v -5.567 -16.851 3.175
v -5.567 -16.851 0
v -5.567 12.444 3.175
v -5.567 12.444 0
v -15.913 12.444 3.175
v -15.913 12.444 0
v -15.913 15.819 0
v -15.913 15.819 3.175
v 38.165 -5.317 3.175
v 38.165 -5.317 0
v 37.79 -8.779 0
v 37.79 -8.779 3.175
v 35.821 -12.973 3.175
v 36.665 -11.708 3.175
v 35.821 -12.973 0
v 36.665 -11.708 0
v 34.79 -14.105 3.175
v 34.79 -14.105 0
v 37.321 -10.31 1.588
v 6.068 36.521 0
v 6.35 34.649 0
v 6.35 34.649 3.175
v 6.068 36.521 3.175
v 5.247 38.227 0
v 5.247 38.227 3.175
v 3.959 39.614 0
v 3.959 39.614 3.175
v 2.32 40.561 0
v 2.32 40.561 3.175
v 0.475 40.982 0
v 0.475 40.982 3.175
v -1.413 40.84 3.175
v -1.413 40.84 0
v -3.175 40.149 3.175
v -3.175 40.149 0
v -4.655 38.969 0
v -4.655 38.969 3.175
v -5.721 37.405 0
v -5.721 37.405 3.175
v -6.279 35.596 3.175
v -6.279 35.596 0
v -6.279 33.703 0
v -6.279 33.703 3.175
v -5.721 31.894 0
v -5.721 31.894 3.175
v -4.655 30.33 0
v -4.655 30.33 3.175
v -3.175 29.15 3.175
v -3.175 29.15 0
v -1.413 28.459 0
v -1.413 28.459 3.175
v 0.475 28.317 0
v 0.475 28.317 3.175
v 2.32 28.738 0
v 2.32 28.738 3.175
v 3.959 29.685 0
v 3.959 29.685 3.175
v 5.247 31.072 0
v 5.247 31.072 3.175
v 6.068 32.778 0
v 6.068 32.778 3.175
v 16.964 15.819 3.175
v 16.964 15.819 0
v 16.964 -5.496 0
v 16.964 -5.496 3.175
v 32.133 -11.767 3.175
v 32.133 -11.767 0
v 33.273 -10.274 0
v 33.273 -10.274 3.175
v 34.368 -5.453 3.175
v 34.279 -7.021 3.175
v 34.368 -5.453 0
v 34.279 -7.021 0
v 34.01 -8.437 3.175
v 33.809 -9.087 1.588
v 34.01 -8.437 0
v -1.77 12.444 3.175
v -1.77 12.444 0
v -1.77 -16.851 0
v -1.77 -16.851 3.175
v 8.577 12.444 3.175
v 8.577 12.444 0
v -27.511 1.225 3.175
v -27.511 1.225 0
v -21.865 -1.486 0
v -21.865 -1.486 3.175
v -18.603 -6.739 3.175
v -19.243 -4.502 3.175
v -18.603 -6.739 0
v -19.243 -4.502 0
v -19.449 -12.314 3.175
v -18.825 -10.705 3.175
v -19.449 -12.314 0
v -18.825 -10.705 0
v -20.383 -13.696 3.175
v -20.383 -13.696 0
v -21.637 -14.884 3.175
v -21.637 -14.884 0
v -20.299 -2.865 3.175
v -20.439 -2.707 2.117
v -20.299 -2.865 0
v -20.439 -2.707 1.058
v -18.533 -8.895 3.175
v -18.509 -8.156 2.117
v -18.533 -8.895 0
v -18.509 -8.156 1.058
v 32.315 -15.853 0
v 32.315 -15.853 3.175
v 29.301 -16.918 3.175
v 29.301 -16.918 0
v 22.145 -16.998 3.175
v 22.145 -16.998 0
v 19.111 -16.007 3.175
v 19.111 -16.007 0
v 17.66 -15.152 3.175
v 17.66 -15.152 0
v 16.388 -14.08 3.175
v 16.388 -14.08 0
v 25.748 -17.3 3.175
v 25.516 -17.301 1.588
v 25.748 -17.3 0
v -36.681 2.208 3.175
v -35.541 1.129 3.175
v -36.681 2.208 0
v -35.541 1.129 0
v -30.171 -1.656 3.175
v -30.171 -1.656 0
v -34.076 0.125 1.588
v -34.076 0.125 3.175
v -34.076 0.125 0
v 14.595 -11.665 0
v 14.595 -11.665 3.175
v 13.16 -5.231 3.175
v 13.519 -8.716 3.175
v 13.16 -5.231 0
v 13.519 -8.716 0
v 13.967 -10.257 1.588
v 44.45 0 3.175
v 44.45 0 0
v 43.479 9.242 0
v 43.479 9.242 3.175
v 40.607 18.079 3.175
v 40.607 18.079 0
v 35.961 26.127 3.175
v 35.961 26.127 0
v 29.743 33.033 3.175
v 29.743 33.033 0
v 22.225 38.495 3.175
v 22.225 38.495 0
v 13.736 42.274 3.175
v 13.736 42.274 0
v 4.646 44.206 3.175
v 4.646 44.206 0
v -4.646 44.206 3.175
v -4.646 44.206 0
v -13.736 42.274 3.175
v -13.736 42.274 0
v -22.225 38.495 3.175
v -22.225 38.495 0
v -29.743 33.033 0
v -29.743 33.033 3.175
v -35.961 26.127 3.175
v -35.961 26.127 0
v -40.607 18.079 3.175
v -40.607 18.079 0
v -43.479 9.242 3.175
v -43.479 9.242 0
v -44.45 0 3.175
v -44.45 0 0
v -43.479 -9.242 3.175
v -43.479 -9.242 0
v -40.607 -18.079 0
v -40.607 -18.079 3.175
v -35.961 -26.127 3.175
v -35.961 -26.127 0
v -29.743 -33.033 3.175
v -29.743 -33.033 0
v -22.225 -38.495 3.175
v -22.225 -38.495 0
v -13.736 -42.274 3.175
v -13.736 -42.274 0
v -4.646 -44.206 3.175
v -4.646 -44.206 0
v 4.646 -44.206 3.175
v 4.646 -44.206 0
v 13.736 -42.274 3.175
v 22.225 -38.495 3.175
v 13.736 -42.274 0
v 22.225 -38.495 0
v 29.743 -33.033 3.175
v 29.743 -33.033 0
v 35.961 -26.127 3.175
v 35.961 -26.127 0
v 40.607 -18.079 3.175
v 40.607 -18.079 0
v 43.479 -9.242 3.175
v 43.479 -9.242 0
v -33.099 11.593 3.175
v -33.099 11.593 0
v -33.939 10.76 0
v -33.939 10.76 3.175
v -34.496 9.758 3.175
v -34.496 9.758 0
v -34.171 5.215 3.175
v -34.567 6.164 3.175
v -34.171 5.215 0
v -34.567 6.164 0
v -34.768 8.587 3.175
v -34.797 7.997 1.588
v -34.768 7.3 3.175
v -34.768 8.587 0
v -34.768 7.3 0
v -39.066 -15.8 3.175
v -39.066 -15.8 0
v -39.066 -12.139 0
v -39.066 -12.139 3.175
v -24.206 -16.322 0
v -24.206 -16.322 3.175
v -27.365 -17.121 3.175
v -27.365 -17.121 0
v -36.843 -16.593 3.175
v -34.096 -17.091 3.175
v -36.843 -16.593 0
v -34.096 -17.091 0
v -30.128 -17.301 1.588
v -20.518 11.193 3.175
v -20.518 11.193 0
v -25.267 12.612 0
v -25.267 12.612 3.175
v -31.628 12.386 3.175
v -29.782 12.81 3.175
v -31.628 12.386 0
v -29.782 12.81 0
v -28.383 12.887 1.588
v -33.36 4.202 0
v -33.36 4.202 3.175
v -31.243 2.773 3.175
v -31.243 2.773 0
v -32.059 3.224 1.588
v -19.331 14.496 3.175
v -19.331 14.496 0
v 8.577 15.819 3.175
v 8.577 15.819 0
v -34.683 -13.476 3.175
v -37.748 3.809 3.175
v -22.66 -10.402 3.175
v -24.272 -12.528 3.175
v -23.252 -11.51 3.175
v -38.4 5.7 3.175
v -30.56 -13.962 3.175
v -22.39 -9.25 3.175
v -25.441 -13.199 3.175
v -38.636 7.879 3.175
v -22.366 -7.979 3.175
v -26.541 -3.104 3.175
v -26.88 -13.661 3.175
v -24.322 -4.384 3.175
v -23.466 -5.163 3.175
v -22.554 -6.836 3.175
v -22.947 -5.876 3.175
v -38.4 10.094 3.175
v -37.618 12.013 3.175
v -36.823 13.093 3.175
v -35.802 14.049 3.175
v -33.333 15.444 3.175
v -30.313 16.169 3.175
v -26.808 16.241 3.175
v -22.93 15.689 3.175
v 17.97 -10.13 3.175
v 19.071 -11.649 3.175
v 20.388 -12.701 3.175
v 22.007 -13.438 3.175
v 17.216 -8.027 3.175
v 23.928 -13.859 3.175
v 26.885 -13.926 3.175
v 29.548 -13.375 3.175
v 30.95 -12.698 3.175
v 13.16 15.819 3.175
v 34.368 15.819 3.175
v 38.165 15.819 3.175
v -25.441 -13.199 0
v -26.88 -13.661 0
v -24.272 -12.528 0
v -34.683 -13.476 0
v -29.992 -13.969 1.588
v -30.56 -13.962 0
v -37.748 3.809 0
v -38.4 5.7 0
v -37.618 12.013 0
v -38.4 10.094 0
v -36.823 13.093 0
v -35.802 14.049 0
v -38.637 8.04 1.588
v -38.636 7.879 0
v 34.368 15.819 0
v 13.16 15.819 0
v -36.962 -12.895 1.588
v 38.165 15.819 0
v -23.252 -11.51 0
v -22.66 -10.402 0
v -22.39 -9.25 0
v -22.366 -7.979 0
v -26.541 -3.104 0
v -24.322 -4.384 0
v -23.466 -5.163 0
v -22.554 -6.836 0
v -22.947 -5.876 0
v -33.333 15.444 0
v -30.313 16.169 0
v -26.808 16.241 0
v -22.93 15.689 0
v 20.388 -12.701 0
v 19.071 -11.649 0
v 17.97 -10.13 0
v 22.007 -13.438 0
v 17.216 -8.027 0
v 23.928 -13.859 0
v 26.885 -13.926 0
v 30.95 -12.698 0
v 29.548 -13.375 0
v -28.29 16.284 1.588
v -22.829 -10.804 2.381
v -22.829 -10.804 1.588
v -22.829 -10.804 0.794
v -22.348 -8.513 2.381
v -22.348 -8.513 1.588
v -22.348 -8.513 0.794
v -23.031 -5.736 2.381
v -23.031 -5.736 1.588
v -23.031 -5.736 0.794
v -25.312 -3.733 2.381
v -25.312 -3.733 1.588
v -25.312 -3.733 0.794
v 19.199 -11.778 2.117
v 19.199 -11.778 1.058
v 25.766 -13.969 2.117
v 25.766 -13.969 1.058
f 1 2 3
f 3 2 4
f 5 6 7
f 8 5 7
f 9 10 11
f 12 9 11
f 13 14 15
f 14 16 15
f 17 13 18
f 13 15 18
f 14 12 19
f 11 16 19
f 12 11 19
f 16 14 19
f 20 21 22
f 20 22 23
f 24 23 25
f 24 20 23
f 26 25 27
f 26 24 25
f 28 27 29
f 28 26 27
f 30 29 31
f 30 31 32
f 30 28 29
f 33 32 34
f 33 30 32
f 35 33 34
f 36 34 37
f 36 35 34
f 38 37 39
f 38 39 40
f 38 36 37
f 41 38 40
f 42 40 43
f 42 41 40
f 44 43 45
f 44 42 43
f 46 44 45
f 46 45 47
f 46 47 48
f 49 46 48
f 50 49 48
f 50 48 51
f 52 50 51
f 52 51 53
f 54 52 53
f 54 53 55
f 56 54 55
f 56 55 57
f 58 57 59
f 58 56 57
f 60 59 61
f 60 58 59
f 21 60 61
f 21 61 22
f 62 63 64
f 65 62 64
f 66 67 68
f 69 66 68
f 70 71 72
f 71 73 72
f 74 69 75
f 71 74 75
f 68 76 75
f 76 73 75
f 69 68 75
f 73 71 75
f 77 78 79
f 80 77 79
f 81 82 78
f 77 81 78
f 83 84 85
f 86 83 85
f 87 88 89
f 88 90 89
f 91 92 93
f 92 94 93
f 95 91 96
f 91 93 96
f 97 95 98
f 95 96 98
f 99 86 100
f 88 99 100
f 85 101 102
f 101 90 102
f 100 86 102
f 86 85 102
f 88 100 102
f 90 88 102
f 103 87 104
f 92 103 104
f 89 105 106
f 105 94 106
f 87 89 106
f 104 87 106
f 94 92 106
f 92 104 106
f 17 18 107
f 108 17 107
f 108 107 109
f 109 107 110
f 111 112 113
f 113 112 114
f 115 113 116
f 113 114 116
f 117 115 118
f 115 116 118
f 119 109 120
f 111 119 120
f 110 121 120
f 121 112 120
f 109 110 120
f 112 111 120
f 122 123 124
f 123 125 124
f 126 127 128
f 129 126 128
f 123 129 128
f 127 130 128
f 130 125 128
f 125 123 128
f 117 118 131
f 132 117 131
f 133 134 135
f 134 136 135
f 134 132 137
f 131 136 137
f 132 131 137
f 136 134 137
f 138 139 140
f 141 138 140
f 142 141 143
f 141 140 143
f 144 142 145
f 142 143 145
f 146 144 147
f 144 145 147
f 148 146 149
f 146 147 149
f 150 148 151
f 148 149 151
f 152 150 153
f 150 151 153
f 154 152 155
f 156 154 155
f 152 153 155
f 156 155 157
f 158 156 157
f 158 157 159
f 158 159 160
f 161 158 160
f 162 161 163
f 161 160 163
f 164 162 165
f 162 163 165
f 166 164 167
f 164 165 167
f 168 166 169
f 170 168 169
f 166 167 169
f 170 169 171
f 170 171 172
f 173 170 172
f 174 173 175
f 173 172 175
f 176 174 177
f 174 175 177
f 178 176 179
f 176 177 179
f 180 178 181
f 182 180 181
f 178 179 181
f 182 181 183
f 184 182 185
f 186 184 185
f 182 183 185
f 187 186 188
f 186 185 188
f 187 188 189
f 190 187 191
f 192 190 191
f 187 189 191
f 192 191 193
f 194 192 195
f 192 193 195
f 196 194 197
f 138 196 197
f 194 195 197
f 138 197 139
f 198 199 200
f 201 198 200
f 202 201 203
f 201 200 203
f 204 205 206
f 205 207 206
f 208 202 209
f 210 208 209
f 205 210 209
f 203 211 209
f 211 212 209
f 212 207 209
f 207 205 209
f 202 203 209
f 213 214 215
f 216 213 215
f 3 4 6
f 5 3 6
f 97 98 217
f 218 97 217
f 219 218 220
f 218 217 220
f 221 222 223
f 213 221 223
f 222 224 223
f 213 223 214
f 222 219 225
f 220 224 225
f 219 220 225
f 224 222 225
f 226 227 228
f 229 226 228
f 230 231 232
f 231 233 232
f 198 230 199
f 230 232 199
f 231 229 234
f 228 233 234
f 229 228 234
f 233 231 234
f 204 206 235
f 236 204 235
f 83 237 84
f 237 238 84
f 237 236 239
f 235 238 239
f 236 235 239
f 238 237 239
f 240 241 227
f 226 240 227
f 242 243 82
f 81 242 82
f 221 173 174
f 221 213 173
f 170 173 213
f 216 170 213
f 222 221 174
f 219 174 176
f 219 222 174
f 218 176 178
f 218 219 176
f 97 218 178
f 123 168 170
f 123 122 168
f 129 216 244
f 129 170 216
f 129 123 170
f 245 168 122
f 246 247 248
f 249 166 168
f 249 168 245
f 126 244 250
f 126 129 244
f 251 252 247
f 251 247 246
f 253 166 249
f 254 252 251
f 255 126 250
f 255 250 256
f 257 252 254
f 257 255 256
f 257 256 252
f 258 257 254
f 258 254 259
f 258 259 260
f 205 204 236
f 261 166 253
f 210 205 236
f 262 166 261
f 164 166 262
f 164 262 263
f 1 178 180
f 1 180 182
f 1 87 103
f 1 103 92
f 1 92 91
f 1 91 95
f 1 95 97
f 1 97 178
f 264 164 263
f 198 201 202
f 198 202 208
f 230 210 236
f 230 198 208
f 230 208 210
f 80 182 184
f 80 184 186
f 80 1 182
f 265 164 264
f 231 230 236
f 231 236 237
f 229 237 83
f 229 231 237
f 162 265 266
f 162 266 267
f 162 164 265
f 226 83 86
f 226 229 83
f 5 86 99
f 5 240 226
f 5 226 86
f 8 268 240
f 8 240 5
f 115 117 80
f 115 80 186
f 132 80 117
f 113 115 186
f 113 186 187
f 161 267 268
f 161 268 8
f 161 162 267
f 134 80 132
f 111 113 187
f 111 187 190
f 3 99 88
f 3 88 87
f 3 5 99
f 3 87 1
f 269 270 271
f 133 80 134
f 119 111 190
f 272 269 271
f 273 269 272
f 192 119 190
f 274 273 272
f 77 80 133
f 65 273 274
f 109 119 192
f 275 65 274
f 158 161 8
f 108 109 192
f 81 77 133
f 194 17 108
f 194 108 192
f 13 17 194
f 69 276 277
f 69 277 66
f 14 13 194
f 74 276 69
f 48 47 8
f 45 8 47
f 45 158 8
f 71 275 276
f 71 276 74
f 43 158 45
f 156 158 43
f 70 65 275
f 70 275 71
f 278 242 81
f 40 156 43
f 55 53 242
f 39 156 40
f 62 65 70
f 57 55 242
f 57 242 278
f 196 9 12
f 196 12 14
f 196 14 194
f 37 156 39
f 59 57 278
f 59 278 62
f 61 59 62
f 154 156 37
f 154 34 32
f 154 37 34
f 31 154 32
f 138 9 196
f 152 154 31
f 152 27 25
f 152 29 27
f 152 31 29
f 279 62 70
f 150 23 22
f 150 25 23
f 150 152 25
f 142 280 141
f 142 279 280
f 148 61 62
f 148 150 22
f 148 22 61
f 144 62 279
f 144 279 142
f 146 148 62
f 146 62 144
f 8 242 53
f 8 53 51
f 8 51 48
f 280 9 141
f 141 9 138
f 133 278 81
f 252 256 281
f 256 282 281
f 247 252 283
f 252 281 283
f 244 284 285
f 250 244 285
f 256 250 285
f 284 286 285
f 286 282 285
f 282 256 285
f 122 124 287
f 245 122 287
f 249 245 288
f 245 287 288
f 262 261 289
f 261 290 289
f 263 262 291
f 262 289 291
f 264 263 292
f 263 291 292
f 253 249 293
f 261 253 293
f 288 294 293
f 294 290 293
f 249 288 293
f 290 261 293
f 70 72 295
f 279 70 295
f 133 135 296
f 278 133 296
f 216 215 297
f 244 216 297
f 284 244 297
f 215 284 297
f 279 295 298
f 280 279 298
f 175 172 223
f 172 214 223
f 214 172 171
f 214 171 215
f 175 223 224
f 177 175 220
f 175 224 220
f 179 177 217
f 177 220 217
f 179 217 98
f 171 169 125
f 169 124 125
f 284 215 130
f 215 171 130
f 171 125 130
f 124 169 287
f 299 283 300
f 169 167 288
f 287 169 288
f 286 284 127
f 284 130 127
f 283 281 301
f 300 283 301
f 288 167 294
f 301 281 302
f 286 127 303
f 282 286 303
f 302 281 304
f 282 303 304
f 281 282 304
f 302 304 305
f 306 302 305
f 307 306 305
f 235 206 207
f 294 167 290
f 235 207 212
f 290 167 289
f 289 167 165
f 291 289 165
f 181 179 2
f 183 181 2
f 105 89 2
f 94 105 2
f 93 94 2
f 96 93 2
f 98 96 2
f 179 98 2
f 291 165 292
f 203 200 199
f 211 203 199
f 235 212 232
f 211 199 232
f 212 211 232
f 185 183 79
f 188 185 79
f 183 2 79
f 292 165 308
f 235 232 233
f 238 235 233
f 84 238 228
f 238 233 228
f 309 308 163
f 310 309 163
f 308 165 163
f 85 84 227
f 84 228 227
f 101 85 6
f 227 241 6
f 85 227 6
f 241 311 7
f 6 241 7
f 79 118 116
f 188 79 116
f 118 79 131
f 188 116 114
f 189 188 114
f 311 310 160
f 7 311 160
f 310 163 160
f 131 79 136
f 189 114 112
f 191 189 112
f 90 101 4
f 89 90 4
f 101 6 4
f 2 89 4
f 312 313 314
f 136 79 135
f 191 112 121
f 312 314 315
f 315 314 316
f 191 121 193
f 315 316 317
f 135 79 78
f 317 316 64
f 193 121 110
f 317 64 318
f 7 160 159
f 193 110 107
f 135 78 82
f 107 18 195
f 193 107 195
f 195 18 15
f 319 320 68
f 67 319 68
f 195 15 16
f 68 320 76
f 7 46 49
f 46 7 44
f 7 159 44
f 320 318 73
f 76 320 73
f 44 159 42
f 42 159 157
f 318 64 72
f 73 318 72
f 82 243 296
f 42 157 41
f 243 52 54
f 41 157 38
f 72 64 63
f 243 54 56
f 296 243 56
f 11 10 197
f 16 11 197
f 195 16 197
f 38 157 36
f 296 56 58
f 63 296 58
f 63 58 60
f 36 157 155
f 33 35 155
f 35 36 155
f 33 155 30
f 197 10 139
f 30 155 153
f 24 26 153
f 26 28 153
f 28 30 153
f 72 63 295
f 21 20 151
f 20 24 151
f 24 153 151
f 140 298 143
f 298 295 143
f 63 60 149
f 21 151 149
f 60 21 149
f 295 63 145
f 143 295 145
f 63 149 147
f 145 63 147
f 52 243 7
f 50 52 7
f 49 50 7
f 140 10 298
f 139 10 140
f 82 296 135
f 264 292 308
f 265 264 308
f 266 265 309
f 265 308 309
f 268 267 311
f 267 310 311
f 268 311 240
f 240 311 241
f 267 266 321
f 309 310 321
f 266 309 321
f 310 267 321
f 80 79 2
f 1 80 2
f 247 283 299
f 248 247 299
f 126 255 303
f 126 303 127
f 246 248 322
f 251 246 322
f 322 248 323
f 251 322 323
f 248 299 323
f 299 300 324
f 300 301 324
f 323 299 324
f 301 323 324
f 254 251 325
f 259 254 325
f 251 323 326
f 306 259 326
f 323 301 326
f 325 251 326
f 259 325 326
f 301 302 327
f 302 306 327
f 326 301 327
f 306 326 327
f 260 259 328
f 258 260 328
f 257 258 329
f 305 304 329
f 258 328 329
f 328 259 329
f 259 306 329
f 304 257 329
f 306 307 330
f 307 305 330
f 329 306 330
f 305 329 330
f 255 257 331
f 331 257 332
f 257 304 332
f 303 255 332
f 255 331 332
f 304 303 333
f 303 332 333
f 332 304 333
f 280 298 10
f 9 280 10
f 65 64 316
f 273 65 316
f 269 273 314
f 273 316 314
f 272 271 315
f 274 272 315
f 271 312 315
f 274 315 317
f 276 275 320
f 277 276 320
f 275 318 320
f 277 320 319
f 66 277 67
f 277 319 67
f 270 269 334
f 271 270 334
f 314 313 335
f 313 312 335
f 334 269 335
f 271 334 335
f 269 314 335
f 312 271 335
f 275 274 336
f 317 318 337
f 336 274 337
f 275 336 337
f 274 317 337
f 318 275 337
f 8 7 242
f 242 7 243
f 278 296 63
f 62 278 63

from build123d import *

# Parameters (mm, degrees)
F0_R     = 44.45
F0_R_2   = 6.35
F1_DEPTH = 3.175


with BuildPart() as f1:
    # F0 (on Top) → F1 (new body)
    with BuildSketch(Plane.XY):
        Circle(F0_R)
        with BuildLine():
            add(Edge.make_bspline(
                [(-20.4392500678, -2.7074250448), (-18.5086635833, -4.8096192168), (-18.5086635833, -8.1559691232)],
                knots=[0, 0, 0, 1, 1, 1], degree=2))
            add(Edge.make_bspline(
                [(-18.5086635833, -8.1559691232), (-18.5086635833, -12.4676122719), (-21.6369287203, -14.8844205377)],
                knots=[0, 0, 0, 1, 1, 1], degree=2))
            add(Edge.make_bspline(
                [(-21.6369287203, -14.8844205377), (-24.7651938572, -17.3012288034), (-30.1279340918, -17.3012288034)],
                knots=[0, 0, 0, 1, 1, 1], degree=2))
            add(Edge.make_bspline(
                [(-30.1279340918, -17.3012288034), (-35.9339941859, -17.3012288034), (-39.065834483, -15.7996615377)],
                knots=[0, 0, 0, 1, 1, 1], degree=2))
            Line((-39.065834483, -15.7996615377), (-39.065834483, -12.1386975375))
            add(Edge.make_bspline(
                [(-39.065834483, -12.1386975375), (-37.0494441547, -12.9824353344), (-34.6826881312, -13.475807436)],
                knots=[0, 0, 0, 1, 1, 1], degree=2))
            add(Edge.make_bspline(
                [(-34.6826881312, -13.475807436), (-32.3159321076, -13.9691795376), (-29.9920780059, -13.9691795376)],
                knots=[0, 0, 0, 1, 1, 1], degree=2))
            add(Edge.make_bspline(
                [(-29.9920780059, -13.9691795376), (-26.1952579197, -13.9691795376), (-24.2718217556, -12.5283899946)],
                knots=[0, 0, 0, 1, 1, 1], degree=2))
            add(Edge.make_bspline(
                [(-24.2718217556, -12.5283899946), (-22.3483855914, -11.0876004515), (-22.3483855914, -8.5134851389)],
                knots=[0, 0, 0, 1, 1, 1], degree=2))
            add(Edge.make_bspline(
                [(-22.3483855914, -8.5134851389), (-22.3483855914, -6.8188592247), (-23.0312411813, -5.7355856973)],
                knots=[0, 0, 0, 1, 1, 1], degree=2))
            add(Edge.make_bspline(
                [(-23.0312411813, -5.7355856973), (-23.7140967712, -4.6523121699), (-25.3121933611, -3.7334960097)],
                knots=[0, 0, 0, 1, 1, 1], degree=2))
            add(Edge.make_bspline(
                [(-25.3121933611, -3.7334960097), (-26.910289951, -2.8146798495), (-30.1708360137, -1.6563279588)],
                knots=[0, 0, 0, 1, 1, 1], degree=2))
            add(Edge.make_bspline(
                [(-30.1708360137, -1.6563279588), (-34.725590053, -0.0260549274), (-36.6812026586, 2.2084201704)],
                knots=[0, 0, 0, 1, 1, 1], degree=2))
            add(Edge.make_bspline(
                [(-36.6812026586, 2.2084201704), (-38.6368152642, 4.4428952681), (-38.6368152642, 8.0395063855)],
                knots=[0, 0, 0, 1, 1, 1], degree=2))
            add(Edge.make_bspline(
                [(-38.6368152642, 8.0395063855), (-38.6368152642, 11.8148755108), (-35.8017132601, 14.0493506086)],
                knots=[0, 0, 0, 1, 1, 1], degree=2))
            add(Edge.make_bspline(
                [(-35.8017132601, 14.0493506086), (-32.9666112561, 16.2838257063), (-28.2903017714, 16.2838257063)],
                knots=[0, 0, 0, 1, 1, 1], degree=2))
            add(Edge.make_bspline(
                [(-28.2903017714, 16.2838257063), (-23.4209336383, 16.2838257063), (-19.3309504193, 14.4962456281)],
                knots=[0, 0, 0, 1, 1, 1], degree=2))
            Line((-19.3309504193, 14.4962456281), (-20.5179035913, 11.1927976435))
            add(Edge.make_bspline(
                [(-20.5179035913, 11.1927976435), (-24.5649848884, 12.8874235577), (-28.3832559355, 12.8874235577)],
                knots=[0, 0, 0, 1, 1, 1], degree=2))
            add(Edge.make_bspline(
                [(-28.3832559355, 12.8874235577), (-31.4006911075, 12.8874235577), (-33.0988921819, 11.5932155811)],
                knots=[0, 0, 0, 1, 1, 1], degree=2))
            add(Edge.make_bspline(
                [(-33.0988921819, 11.5932155811), (-34.7970932562, 10.2990076044), (-34.7970932562, 7.9966044637)],
                knots=[0, 0, 0, 1, 1, 1], degree=2))
            add(Edge.make_bspline(
                [(-34.7970932562, 7.9966044637), (-34.7970932562, 6.3019785495), (-34.1714402288, 5.2151298619)],
                knots=[0, 0, 0, 1, 1, 1], degree=2))
            add(Edge.make_bspline(
                [(-34.1714402288, 5.2151298619), (-33.5457872014, 4.1282811744), (-32.0585205763, 3.2237656548)],
                knots=[0, 0, 0, 1, 1, 1], degree=2))
            add(Edge.make_bspline(
                [(-32.0585205763, 3.2237656548), (-30.5712539512, 2.3192501352), (-27.5109168573, 1.2252511273)],
                knots=[0, 0, 0, 1, 1, 1], degree=2))
            add(Edge.make_bspline(
                [(-27.5109168573, 1.2252511273), (-22.3698365523, -0.6052308728), (-20.4392500678, -2.7074250448)],
                knots=[0, 0, 0, 1, 1, 1], degree=2))
        make_face(mode=Mode.SUBTRACT)
        Polygon((-1.7697637308, 12.4441036983), (-1.7697637308, -16.8507586237), (-5.566583817, -16.8507586237), (-5.566583817, 12.4441036983), (-15.9130973098, 12.4441036983), (-15.9130973098, 15.819054886), (8.576749762, 15.819054886), (8.576749762, 12.4441036983), align=None, mode=Mode.SUBTRACT)
        with BuildLine():
            Line((34.3679551307, 15.819054886), (38.1647752168, 15.819054886))
            Line((38.1647752168, 15.819054886), (38.1647752168, -5.317291959))
            add(Edge.make_bspline(
                [(38.1647752168, -5.317291959), (38.1647752168, -10.9088424437), (34.7898240291, -14.1050356236)],
                knots=[0, 0, 0, 1, 1, 1], degree=2))
            add(Edge.make_bspline(
                [(34.7898240291, -14.1050356236), (31.4148728414, -17.3012288034), (25.5158585833, -17.3012288034)],
                knots=[0, 0, 0, 1, 1, 1], degree=2))
            add(Edge.make_bspline(
                [(25.5158585833, -17.3012288034), (19.6168443251, -17.3012288034), (16.3884747038, -14.0800095025)],
                knots=[0, 0, 0, 1, 1, 1], degree=2))
            add(Edge.make_bspline(
                [(16.3884747038, -14.0800095025), (13.1601050826, -10.8587902015), (13.1601050826, -5.2314881152)],
                knots=[0, 0, 0, 1, 1, 1], degree=2))
            Line((13.1601050826, -5.2314881152), (13.1601050826, 15.819054886))
            Line((13.1601050826, 15.819054886), (16.964075489, 15.819054886))
            Line((16.964075489, 15.819054886), (16.964075489, -5.4960499668))
            add(Edge.make_bspline(
                [(16.964075489, -5.4960499668), (16.964075489, -9.5860331858), (19.1985505868, -11.7776063617)],
                knots=[0, 0, 0, 1, 1, 1], degree=2))
            add(Edge.make_bspline(
                [(19.1985505868, -11.7776063617), (21.4330256846, -13.9691795376), (25.7661197942, -13.9691795376)],
                knots=[0, 0, 0, 1, 1, 1], degree=2))
            add(Edge.make_bspline(
                [(25.7661197942, -13.9691795376), (29.8990049351, -13.9691795376), (32.1334800329, -11.7668808812)],
                knots=[0, 0, 0, 1, 1, 1], degree=2))
            add(Edge.make_bspline(
                [(32.1334800329, -11.7668808812), (34.3679551307, -9.5645822249), (34.3679551307, -5.4531480449)],
                knots=[0, 0, 0, 1, 1, 1], degree=2))
            Line((34.3679551307, -5.4531480449), (34.3679551307, 15.819054886))
        make_face(mode=Mode.SUBTRACT)
        with Locations((0, 34.6494875848)):
            Circle(F0_R_2, mode=Mode.SUBTRACT)
    extrude(amount=F1_DEPTH)


solid = f1.part
